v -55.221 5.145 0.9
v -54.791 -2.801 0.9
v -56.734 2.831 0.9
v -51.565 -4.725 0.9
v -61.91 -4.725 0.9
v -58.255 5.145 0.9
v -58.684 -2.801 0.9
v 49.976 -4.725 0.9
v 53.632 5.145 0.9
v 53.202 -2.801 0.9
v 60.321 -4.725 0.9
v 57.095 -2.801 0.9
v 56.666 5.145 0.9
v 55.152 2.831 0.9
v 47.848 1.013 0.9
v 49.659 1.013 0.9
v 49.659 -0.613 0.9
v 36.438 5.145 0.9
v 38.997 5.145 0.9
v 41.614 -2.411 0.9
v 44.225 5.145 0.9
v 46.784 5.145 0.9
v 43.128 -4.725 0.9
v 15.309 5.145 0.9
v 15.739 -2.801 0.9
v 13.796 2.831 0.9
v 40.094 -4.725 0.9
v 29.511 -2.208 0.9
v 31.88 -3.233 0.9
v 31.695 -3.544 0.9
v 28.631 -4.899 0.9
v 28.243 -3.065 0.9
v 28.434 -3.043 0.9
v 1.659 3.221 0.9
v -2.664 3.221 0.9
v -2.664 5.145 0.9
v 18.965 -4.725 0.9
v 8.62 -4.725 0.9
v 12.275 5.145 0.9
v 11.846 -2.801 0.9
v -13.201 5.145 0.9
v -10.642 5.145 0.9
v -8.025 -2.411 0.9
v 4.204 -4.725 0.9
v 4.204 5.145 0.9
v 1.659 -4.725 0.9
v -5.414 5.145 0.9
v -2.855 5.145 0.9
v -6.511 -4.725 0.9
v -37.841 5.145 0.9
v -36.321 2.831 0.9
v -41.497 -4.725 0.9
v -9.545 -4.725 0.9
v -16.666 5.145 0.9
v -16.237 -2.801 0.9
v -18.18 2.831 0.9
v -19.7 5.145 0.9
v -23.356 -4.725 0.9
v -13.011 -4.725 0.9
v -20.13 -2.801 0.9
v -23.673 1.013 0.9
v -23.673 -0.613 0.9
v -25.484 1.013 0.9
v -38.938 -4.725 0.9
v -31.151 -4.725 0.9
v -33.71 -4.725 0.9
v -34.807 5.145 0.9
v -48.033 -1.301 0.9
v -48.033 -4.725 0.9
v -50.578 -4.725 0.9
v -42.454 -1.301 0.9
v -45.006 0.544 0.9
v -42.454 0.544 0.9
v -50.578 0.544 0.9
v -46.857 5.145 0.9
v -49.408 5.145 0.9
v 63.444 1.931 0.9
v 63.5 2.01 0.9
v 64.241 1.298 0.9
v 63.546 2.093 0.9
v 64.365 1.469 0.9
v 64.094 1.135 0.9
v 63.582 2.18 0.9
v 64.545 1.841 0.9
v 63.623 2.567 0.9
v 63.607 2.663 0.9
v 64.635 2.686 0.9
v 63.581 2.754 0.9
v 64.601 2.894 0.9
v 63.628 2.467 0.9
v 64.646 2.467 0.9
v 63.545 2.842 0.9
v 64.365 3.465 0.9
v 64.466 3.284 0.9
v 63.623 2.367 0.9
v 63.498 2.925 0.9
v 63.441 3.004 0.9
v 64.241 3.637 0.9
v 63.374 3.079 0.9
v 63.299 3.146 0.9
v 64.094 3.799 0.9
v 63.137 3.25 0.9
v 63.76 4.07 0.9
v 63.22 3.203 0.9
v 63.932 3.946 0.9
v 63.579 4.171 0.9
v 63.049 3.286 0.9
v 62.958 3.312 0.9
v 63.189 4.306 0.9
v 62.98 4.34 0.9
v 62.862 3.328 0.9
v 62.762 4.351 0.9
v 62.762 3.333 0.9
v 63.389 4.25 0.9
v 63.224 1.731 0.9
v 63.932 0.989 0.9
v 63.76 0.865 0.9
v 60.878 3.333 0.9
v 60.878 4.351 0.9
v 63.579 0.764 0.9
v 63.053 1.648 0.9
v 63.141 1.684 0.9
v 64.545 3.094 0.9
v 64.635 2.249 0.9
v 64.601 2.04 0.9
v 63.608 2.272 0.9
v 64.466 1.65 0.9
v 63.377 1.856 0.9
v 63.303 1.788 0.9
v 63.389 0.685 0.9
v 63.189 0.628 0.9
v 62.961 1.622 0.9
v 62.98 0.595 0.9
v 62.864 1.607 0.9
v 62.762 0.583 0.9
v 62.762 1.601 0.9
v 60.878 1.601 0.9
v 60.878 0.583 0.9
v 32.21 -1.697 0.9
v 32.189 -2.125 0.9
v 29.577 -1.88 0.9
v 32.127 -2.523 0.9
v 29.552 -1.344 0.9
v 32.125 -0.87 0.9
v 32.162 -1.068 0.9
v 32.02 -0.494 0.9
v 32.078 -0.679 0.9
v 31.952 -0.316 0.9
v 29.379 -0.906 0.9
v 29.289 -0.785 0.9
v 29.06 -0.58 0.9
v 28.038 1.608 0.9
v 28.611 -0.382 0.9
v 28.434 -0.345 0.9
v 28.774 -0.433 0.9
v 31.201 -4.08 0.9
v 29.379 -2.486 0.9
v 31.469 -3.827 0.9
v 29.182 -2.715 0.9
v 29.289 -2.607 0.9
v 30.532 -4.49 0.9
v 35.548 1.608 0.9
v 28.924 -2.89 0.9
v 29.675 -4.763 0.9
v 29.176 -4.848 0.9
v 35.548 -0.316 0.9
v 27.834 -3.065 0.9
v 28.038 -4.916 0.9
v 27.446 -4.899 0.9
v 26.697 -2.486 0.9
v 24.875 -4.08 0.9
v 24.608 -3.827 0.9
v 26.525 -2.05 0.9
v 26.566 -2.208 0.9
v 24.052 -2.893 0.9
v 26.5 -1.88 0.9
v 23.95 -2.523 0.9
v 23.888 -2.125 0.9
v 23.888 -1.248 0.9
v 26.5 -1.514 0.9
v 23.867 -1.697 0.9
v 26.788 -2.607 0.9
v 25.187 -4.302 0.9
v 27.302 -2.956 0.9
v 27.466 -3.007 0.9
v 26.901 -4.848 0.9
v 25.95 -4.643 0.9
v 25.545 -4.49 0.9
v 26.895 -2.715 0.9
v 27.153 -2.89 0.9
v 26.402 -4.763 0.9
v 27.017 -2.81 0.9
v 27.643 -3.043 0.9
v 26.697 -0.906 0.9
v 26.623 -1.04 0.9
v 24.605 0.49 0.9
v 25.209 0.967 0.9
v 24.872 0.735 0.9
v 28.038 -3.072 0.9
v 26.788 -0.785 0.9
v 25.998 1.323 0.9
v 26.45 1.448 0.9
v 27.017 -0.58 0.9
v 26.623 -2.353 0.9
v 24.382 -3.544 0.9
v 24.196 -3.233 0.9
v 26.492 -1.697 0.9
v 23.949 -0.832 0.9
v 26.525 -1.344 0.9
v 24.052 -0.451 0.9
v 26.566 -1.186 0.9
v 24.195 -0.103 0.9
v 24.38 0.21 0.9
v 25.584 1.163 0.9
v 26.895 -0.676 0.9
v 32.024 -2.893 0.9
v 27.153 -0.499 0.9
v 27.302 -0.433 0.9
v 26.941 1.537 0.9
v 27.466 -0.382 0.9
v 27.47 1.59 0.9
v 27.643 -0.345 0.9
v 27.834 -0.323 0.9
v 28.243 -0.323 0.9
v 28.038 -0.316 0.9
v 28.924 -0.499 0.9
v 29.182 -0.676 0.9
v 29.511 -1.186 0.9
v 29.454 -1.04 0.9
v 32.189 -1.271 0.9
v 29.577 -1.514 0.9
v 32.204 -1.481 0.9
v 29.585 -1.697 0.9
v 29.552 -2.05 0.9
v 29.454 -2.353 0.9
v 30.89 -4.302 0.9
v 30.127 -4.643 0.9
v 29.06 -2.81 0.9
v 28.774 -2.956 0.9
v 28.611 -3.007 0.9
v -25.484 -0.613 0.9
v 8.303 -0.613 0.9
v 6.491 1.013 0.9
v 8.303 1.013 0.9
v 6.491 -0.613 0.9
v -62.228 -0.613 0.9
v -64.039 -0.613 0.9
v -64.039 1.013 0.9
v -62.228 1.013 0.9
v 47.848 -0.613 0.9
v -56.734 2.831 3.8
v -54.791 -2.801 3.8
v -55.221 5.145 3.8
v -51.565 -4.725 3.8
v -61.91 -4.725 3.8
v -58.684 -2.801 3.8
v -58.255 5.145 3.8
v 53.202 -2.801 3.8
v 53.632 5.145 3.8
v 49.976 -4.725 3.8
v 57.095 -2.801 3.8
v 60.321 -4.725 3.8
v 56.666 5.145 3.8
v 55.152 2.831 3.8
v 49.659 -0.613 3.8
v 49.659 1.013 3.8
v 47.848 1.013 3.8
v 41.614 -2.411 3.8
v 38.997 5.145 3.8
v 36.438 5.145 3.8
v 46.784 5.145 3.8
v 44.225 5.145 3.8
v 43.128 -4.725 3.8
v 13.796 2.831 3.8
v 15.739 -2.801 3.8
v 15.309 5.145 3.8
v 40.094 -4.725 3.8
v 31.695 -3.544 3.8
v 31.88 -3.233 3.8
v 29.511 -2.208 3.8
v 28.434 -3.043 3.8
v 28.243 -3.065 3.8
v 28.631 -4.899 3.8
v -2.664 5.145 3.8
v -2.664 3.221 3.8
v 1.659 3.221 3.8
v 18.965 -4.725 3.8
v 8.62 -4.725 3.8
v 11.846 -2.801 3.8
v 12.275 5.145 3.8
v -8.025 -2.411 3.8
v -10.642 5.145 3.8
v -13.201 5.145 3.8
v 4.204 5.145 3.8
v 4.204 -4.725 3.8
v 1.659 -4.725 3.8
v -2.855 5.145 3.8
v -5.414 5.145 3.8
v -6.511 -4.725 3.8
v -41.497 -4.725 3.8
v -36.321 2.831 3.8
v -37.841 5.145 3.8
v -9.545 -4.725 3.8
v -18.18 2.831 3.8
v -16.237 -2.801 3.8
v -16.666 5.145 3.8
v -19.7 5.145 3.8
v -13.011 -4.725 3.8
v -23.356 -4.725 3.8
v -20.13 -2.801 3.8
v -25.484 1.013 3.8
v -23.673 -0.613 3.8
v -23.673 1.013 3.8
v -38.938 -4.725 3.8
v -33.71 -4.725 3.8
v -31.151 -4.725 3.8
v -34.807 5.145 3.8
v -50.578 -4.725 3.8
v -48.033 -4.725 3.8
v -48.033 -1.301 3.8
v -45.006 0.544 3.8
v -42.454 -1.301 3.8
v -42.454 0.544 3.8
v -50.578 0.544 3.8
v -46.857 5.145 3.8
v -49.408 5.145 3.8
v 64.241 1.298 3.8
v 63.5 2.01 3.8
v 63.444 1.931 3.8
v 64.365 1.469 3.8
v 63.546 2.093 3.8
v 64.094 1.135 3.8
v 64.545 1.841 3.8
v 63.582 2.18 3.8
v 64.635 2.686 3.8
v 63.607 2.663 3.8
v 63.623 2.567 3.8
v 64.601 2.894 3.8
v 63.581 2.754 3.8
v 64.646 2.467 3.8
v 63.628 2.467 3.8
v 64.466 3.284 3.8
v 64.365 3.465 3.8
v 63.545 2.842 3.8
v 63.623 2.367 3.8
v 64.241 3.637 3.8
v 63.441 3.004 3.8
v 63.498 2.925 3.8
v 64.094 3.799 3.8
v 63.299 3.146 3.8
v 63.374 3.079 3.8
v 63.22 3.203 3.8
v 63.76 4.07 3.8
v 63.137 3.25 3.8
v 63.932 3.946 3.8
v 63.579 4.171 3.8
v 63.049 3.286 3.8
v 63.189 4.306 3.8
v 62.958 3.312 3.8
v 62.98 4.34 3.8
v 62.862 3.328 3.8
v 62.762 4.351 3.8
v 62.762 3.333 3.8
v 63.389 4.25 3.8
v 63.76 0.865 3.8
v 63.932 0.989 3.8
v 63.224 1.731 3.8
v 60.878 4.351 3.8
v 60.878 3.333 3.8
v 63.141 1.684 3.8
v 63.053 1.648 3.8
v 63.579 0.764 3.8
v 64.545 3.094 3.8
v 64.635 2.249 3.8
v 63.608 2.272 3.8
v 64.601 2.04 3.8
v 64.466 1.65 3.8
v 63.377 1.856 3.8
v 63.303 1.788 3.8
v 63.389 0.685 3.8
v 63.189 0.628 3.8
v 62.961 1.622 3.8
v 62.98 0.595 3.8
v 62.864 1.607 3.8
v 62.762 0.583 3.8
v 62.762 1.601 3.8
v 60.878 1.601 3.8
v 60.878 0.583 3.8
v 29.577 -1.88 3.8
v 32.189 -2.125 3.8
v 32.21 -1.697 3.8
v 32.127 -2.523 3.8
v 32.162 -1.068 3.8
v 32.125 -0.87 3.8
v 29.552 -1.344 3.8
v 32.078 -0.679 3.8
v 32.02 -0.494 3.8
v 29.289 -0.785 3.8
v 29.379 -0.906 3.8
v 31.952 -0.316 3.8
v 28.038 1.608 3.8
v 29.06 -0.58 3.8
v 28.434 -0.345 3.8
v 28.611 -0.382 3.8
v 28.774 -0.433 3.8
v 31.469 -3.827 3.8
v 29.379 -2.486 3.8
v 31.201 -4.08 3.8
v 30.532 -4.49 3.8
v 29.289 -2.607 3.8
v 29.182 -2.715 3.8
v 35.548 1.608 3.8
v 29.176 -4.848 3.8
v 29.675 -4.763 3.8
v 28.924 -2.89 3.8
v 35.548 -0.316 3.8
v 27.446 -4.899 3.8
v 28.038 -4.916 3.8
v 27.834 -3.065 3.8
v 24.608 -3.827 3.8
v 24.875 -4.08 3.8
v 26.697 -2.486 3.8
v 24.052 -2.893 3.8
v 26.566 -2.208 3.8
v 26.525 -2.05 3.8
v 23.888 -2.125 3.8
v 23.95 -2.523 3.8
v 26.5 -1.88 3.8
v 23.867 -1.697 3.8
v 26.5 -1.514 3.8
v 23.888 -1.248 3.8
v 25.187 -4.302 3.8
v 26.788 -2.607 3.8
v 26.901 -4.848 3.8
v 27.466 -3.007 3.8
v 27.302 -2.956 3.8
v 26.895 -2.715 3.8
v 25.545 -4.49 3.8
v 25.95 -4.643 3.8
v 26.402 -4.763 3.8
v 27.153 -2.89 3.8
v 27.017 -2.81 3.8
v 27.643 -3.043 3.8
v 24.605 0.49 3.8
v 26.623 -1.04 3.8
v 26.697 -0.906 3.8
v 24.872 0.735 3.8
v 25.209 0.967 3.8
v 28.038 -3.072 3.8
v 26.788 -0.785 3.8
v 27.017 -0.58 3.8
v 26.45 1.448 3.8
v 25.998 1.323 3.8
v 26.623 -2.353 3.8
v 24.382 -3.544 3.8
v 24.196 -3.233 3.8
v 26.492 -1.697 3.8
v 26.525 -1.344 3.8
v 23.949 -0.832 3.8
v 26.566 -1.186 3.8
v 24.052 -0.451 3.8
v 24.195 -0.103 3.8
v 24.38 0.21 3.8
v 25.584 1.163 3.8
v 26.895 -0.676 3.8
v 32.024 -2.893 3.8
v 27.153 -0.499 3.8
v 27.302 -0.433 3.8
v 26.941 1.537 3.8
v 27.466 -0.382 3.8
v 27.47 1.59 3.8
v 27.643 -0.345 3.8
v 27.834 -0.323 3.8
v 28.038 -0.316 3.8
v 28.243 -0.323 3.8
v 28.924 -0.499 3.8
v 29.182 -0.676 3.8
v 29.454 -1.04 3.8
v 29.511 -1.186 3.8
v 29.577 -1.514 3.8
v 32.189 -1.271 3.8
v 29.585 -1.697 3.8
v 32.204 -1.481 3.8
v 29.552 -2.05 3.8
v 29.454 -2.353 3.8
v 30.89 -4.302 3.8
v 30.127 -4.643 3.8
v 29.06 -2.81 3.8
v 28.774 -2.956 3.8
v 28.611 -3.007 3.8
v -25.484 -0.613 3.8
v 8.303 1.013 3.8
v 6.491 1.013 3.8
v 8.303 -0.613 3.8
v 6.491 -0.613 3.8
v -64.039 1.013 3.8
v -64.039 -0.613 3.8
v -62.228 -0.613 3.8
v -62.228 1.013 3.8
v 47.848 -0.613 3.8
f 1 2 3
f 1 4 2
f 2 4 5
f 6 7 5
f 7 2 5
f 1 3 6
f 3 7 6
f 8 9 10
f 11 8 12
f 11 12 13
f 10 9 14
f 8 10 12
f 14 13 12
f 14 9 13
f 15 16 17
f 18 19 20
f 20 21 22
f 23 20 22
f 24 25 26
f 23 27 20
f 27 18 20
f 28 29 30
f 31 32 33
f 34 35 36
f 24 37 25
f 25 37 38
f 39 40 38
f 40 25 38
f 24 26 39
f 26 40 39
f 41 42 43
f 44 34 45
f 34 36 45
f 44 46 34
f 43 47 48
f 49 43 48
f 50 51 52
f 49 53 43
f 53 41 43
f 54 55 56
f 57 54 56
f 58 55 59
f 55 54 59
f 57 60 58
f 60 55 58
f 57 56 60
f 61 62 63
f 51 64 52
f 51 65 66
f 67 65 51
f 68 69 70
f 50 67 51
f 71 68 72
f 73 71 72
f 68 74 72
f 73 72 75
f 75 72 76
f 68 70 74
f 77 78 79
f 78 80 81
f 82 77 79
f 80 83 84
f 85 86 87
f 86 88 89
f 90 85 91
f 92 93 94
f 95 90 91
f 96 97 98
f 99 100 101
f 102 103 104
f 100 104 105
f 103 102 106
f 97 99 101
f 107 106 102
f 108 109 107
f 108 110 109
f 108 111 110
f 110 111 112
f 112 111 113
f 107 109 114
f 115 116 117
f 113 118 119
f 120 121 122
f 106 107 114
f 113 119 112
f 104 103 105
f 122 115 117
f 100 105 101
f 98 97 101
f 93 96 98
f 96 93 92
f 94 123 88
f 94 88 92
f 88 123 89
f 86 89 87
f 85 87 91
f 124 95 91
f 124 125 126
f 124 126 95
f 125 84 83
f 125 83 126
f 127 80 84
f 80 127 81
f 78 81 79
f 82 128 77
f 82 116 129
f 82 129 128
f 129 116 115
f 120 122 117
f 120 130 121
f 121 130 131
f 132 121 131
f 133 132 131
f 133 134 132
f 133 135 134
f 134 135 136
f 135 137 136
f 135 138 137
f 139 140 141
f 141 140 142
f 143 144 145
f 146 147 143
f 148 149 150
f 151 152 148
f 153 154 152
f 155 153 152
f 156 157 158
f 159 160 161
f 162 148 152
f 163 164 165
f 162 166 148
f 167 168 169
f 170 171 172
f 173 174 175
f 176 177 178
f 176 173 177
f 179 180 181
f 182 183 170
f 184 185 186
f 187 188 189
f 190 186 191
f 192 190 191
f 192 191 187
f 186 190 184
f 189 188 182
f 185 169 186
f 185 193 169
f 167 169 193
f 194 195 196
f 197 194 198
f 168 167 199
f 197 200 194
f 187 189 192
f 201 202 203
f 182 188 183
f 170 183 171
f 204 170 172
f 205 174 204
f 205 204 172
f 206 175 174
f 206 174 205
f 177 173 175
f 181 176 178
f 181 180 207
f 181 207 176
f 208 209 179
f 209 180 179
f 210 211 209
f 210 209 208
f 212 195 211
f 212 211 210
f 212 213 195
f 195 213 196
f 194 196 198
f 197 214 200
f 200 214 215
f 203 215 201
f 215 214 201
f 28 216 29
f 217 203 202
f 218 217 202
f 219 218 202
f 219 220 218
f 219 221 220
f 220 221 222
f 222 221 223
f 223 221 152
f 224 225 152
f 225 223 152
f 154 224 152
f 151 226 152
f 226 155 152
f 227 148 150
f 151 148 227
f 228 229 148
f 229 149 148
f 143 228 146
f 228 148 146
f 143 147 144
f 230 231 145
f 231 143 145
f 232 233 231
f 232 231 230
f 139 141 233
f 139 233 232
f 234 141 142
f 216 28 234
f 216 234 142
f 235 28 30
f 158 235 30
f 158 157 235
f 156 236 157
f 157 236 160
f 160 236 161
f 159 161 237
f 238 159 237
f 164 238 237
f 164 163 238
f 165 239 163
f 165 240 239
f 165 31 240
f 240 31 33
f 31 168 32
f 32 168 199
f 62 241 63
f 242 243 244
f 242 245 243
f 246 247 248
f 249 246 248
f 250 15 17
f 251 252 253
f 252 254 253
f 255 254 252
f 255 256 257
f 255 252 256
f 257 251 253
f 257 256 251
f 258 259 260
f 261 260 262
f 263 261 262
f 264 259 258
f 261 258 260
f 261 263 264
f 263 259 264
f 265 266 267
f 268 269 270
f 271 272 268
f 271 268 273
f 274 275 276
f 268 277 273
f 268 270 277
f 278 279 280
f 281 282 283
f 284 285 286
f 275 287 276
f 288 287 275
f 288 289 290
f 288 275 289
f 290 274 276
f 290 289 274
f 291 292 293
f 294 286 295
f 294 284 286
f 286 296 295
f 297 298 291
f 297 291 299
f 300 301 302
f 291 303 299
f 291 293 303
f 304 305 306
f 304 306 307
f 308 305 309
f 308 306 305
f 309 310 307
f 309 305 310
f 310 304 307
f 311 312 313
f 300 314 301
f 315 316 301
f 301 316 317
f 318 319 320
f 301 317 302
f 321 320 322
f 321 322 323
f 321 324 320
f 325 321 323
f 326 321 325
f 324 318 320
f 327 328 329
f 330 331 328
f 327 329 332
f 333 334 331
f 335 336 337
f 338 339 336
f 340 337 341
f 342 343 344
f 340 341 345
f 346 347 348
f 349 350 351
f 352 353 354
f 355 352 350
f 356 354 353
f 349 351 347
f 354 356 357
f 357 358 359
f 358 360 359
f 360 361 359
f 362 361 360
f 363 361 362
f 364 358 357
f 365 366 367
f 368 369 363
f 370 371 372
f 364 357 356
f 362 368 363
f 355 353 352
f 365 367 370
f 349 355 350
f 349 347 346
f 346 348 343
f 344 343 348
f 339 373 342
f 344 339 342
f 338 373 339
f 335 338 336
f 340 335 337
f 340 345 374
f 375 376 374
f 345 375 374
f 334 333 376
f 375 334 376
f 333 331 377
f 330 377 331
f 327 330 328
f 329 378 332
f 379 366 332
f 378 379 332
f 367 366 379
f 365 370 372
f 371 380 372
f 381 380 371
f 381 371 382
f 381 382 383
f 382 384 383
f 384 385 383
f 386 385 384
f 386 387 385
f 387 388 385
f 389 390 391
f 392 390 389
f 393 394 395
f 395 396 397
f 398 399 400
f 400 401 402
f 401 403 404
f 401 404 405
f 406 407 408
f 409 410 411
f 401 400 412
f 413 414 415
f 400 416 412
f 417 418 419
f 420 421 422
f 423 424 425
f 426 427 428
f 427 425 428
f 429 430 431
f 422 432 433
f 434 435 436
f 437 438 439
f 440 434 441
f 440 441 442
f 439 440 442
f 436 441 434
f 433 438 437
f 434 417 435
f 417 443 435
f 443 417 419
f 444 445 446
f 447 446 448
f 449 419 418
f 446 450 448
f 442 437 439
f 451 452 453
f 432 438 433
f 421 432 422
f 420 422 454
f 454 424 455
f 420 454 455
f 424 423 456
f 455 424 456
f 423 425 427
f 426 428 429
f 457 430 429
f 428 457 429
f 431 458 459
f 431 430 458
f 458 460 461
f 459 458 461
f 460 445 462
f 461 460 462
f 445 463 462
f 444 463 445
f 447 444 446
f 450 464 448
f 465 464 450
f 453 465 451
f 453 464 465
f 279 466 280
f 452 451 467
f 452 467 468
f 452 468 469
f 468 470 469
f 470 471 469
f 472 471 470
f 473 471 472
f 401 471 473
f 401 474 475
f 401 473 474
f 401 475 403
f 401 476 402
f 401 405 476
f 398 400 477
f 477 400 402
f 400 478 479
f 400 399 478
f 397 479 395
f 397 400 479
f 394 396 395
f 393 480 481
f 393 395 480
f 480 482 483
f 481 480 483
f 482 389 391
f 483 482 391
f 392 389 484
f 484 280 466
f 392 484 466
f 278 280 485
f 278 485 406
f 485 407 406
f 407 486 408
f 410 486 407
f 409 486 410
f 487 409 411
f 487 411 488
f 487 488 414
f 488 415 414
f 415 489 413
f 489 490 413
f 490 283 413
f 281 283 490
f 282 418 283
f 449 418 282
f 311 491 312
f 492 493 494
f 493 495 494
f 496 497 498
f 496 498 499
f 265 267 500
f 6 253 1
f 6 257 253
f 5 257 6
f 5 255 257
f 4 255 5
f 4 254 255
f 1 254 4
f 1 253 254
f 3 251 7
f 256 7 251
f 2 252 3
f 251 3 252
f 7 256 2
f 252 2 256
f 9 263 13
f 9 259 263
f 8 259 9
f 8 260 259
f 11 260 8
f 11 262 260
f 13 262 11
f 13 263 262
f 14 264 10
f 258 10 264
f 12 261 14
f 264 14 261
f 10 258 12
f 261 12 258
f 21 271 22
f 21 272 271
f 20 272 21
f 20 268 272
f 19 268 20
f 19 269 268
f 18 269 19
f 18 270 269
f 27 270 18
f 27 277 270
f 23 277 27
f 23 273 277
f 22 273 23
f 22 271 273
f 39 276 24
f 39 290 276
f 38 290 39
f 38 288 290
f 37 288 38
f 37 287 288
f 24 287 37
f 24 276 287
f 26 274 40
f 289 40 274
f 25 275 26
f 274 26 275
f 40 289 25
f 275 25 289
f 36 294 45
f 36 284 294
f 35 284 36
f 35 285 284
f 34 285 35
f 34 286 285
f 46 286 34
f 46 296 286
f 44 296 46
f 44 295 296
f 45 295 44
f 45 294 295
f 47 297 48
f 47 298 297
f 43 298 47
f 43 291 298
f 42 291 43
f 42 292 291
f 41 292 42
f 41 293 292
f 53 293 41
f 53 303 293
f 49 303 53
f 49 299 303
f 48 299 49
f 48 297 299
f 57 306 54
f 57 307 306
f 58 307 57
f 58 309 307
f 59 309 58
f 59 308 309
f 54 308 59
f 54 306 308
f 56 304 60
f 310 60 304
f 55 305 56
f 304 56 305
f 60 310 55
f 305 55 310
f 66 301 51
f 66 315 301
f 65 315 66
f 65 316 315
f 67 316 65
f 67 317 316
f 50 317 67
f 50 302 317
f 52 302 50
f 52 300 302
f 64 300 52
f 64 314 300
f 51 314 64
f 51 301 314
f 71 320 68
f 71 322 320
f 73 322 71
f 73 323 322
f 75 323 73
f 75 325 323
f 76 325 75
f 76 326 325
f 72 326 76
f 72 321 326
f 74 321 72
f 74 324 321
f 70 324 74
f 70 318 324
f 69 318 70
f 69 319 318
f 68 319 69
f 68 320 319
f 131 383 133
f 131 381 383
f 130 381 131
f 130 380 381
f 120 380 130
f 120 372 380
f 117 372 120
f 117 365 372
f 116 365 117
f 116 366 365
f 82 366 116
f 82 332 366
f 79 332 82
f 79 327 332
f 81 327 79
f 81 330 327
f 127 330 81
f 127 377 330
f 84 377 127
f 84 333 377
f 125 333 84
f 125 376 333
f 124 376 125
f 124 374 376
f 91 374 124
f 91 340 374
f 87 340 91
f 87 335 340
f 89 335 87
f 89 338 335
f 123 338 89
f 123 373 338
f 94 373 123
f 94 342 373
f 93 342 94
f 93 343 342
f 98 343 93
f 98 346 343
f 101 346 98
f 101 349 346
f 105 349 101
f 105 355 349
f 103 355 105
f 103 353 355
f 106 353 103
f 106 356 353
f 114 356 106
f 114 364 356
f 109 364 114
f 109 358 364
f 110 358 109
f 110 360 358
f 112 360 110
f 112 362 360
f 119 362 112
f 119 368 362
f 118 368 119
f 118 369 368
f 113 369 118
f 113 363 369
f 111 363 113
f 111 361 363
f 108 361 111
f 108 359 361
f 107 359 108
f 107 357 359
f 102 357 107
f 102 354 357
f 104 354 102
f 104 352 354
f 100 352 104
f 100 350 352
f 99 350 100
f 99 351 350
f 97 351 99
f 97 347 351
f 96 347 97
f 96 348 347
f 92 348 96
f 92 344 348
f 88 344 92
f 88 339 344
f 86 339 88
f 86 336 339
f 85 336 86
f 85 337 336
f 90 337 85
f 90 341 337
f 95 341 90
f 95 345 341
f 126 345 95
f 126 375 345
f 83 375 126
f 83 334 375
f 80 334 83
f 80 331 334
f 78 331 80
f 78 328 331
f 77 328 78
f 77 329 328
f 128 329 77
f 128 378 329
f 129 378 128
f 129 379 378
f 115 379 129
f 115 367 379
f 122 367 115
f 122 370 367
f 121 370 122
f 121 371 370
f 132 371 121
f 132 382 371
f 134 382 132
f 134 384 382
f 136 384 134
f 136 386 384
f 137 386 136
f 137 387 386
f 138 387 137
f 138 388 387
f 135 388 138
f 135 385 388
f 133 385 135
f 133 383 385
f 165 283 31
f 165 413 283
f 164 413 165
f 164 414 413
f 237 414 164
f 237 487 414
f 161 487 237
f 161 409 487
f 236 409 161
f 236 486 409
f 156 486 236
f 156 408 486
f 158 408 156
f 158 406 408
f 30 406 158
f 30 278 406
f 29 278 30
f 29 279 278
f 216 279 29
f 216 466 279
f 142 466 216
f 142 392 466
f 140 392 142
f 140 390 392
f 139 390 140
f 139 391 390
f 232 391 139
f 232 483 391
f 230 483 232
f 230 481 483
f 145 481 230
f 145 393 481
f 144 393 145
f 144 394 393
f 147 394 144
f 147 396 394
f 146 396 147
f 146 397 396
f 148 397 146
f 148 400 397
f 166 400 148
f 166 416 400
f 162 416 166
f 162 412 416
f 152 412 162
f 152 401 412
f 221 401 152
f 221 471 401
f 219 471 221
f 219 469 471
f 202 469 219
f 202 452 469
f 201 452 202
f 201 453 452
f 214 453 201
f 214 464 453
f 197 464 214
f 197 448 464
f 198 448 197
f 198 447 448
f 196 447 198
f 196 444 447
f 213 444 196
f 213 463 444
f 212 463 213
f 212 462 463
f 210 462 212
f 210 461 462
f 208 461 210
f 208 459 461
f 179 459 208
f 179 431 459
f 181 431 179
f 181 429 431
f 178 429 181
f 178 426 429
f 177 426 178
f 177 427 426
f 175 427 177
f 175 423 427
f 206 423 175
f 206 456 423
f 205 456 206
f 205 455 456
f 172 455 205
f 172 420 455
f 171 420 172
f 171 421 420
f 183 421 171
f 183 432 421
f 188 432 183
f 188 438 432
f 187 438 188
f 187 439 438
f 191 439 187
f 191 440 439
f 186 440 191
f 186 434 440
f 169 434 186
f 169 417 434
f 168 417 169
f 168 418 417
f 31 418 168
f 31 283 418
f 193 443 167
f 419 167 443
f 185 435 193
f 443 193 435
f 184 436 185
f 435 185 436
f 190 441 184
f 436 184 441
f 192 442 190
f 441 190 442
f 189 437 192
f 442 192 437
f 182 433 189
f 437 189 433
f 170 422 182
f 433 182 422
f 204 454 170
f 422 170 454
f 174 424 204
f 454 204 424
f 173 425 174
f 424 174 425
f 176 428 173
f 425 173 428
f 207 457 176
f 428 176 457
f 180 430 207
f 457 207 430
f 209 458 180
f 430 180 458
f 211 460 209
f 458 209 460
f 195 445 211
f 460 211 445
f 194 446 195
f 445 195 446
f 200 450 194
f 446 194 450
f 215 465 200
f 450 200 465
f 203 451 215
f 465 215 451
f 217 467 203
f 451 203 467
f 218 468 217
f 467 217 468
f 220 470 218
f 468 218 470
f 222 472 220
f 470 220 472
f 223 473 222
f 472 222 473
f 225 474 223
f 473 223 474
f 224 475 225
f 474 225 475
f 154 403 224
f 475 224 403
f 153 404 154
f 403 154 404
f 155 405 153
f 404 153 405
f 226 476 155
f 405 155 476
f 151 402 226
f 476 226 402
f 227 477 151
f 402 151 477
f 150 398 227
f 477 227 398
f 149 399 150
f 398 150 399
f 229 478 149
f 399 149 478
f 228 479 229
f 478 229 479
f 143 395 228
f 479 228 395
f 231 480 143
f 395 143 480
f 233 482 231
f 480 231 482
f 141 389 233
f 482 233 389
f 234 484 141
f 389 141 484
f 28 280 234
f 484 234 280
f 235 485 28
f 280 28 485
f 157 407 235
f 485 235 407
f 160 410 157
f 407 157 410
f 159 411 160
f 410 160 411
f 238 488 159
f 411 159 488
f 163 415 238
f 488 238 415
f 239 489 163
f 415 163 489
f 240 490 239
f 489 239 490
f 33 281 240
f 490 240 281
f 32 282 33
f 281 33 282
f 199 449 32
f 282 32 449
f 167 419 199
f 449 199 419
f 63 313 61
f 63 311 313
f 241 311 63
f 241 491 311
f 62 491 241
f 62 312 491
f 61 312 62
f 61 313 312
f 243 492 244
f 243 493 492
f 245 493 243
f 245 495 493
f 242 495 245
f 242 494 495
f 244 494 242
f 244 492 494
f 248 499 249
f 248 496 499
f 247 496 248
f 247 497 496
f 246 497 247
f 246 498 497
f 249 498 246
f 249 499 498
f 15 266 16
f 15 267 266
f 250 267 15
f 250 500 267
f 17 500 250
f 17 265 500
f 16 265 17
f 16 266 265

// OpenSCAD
$fn = 48;
  // syllabics (overlaid on icon, tallest)
  translate([0, 0.000, 0.900]) linear_extrude(height=2.900) text("ᐎᔨᐱ ᐎᐯᒣᐎ ᓂᐯᐎᐣ", size=9.748, halign="center", valign="center", font="Euphemia UCAS:style=Bold");
